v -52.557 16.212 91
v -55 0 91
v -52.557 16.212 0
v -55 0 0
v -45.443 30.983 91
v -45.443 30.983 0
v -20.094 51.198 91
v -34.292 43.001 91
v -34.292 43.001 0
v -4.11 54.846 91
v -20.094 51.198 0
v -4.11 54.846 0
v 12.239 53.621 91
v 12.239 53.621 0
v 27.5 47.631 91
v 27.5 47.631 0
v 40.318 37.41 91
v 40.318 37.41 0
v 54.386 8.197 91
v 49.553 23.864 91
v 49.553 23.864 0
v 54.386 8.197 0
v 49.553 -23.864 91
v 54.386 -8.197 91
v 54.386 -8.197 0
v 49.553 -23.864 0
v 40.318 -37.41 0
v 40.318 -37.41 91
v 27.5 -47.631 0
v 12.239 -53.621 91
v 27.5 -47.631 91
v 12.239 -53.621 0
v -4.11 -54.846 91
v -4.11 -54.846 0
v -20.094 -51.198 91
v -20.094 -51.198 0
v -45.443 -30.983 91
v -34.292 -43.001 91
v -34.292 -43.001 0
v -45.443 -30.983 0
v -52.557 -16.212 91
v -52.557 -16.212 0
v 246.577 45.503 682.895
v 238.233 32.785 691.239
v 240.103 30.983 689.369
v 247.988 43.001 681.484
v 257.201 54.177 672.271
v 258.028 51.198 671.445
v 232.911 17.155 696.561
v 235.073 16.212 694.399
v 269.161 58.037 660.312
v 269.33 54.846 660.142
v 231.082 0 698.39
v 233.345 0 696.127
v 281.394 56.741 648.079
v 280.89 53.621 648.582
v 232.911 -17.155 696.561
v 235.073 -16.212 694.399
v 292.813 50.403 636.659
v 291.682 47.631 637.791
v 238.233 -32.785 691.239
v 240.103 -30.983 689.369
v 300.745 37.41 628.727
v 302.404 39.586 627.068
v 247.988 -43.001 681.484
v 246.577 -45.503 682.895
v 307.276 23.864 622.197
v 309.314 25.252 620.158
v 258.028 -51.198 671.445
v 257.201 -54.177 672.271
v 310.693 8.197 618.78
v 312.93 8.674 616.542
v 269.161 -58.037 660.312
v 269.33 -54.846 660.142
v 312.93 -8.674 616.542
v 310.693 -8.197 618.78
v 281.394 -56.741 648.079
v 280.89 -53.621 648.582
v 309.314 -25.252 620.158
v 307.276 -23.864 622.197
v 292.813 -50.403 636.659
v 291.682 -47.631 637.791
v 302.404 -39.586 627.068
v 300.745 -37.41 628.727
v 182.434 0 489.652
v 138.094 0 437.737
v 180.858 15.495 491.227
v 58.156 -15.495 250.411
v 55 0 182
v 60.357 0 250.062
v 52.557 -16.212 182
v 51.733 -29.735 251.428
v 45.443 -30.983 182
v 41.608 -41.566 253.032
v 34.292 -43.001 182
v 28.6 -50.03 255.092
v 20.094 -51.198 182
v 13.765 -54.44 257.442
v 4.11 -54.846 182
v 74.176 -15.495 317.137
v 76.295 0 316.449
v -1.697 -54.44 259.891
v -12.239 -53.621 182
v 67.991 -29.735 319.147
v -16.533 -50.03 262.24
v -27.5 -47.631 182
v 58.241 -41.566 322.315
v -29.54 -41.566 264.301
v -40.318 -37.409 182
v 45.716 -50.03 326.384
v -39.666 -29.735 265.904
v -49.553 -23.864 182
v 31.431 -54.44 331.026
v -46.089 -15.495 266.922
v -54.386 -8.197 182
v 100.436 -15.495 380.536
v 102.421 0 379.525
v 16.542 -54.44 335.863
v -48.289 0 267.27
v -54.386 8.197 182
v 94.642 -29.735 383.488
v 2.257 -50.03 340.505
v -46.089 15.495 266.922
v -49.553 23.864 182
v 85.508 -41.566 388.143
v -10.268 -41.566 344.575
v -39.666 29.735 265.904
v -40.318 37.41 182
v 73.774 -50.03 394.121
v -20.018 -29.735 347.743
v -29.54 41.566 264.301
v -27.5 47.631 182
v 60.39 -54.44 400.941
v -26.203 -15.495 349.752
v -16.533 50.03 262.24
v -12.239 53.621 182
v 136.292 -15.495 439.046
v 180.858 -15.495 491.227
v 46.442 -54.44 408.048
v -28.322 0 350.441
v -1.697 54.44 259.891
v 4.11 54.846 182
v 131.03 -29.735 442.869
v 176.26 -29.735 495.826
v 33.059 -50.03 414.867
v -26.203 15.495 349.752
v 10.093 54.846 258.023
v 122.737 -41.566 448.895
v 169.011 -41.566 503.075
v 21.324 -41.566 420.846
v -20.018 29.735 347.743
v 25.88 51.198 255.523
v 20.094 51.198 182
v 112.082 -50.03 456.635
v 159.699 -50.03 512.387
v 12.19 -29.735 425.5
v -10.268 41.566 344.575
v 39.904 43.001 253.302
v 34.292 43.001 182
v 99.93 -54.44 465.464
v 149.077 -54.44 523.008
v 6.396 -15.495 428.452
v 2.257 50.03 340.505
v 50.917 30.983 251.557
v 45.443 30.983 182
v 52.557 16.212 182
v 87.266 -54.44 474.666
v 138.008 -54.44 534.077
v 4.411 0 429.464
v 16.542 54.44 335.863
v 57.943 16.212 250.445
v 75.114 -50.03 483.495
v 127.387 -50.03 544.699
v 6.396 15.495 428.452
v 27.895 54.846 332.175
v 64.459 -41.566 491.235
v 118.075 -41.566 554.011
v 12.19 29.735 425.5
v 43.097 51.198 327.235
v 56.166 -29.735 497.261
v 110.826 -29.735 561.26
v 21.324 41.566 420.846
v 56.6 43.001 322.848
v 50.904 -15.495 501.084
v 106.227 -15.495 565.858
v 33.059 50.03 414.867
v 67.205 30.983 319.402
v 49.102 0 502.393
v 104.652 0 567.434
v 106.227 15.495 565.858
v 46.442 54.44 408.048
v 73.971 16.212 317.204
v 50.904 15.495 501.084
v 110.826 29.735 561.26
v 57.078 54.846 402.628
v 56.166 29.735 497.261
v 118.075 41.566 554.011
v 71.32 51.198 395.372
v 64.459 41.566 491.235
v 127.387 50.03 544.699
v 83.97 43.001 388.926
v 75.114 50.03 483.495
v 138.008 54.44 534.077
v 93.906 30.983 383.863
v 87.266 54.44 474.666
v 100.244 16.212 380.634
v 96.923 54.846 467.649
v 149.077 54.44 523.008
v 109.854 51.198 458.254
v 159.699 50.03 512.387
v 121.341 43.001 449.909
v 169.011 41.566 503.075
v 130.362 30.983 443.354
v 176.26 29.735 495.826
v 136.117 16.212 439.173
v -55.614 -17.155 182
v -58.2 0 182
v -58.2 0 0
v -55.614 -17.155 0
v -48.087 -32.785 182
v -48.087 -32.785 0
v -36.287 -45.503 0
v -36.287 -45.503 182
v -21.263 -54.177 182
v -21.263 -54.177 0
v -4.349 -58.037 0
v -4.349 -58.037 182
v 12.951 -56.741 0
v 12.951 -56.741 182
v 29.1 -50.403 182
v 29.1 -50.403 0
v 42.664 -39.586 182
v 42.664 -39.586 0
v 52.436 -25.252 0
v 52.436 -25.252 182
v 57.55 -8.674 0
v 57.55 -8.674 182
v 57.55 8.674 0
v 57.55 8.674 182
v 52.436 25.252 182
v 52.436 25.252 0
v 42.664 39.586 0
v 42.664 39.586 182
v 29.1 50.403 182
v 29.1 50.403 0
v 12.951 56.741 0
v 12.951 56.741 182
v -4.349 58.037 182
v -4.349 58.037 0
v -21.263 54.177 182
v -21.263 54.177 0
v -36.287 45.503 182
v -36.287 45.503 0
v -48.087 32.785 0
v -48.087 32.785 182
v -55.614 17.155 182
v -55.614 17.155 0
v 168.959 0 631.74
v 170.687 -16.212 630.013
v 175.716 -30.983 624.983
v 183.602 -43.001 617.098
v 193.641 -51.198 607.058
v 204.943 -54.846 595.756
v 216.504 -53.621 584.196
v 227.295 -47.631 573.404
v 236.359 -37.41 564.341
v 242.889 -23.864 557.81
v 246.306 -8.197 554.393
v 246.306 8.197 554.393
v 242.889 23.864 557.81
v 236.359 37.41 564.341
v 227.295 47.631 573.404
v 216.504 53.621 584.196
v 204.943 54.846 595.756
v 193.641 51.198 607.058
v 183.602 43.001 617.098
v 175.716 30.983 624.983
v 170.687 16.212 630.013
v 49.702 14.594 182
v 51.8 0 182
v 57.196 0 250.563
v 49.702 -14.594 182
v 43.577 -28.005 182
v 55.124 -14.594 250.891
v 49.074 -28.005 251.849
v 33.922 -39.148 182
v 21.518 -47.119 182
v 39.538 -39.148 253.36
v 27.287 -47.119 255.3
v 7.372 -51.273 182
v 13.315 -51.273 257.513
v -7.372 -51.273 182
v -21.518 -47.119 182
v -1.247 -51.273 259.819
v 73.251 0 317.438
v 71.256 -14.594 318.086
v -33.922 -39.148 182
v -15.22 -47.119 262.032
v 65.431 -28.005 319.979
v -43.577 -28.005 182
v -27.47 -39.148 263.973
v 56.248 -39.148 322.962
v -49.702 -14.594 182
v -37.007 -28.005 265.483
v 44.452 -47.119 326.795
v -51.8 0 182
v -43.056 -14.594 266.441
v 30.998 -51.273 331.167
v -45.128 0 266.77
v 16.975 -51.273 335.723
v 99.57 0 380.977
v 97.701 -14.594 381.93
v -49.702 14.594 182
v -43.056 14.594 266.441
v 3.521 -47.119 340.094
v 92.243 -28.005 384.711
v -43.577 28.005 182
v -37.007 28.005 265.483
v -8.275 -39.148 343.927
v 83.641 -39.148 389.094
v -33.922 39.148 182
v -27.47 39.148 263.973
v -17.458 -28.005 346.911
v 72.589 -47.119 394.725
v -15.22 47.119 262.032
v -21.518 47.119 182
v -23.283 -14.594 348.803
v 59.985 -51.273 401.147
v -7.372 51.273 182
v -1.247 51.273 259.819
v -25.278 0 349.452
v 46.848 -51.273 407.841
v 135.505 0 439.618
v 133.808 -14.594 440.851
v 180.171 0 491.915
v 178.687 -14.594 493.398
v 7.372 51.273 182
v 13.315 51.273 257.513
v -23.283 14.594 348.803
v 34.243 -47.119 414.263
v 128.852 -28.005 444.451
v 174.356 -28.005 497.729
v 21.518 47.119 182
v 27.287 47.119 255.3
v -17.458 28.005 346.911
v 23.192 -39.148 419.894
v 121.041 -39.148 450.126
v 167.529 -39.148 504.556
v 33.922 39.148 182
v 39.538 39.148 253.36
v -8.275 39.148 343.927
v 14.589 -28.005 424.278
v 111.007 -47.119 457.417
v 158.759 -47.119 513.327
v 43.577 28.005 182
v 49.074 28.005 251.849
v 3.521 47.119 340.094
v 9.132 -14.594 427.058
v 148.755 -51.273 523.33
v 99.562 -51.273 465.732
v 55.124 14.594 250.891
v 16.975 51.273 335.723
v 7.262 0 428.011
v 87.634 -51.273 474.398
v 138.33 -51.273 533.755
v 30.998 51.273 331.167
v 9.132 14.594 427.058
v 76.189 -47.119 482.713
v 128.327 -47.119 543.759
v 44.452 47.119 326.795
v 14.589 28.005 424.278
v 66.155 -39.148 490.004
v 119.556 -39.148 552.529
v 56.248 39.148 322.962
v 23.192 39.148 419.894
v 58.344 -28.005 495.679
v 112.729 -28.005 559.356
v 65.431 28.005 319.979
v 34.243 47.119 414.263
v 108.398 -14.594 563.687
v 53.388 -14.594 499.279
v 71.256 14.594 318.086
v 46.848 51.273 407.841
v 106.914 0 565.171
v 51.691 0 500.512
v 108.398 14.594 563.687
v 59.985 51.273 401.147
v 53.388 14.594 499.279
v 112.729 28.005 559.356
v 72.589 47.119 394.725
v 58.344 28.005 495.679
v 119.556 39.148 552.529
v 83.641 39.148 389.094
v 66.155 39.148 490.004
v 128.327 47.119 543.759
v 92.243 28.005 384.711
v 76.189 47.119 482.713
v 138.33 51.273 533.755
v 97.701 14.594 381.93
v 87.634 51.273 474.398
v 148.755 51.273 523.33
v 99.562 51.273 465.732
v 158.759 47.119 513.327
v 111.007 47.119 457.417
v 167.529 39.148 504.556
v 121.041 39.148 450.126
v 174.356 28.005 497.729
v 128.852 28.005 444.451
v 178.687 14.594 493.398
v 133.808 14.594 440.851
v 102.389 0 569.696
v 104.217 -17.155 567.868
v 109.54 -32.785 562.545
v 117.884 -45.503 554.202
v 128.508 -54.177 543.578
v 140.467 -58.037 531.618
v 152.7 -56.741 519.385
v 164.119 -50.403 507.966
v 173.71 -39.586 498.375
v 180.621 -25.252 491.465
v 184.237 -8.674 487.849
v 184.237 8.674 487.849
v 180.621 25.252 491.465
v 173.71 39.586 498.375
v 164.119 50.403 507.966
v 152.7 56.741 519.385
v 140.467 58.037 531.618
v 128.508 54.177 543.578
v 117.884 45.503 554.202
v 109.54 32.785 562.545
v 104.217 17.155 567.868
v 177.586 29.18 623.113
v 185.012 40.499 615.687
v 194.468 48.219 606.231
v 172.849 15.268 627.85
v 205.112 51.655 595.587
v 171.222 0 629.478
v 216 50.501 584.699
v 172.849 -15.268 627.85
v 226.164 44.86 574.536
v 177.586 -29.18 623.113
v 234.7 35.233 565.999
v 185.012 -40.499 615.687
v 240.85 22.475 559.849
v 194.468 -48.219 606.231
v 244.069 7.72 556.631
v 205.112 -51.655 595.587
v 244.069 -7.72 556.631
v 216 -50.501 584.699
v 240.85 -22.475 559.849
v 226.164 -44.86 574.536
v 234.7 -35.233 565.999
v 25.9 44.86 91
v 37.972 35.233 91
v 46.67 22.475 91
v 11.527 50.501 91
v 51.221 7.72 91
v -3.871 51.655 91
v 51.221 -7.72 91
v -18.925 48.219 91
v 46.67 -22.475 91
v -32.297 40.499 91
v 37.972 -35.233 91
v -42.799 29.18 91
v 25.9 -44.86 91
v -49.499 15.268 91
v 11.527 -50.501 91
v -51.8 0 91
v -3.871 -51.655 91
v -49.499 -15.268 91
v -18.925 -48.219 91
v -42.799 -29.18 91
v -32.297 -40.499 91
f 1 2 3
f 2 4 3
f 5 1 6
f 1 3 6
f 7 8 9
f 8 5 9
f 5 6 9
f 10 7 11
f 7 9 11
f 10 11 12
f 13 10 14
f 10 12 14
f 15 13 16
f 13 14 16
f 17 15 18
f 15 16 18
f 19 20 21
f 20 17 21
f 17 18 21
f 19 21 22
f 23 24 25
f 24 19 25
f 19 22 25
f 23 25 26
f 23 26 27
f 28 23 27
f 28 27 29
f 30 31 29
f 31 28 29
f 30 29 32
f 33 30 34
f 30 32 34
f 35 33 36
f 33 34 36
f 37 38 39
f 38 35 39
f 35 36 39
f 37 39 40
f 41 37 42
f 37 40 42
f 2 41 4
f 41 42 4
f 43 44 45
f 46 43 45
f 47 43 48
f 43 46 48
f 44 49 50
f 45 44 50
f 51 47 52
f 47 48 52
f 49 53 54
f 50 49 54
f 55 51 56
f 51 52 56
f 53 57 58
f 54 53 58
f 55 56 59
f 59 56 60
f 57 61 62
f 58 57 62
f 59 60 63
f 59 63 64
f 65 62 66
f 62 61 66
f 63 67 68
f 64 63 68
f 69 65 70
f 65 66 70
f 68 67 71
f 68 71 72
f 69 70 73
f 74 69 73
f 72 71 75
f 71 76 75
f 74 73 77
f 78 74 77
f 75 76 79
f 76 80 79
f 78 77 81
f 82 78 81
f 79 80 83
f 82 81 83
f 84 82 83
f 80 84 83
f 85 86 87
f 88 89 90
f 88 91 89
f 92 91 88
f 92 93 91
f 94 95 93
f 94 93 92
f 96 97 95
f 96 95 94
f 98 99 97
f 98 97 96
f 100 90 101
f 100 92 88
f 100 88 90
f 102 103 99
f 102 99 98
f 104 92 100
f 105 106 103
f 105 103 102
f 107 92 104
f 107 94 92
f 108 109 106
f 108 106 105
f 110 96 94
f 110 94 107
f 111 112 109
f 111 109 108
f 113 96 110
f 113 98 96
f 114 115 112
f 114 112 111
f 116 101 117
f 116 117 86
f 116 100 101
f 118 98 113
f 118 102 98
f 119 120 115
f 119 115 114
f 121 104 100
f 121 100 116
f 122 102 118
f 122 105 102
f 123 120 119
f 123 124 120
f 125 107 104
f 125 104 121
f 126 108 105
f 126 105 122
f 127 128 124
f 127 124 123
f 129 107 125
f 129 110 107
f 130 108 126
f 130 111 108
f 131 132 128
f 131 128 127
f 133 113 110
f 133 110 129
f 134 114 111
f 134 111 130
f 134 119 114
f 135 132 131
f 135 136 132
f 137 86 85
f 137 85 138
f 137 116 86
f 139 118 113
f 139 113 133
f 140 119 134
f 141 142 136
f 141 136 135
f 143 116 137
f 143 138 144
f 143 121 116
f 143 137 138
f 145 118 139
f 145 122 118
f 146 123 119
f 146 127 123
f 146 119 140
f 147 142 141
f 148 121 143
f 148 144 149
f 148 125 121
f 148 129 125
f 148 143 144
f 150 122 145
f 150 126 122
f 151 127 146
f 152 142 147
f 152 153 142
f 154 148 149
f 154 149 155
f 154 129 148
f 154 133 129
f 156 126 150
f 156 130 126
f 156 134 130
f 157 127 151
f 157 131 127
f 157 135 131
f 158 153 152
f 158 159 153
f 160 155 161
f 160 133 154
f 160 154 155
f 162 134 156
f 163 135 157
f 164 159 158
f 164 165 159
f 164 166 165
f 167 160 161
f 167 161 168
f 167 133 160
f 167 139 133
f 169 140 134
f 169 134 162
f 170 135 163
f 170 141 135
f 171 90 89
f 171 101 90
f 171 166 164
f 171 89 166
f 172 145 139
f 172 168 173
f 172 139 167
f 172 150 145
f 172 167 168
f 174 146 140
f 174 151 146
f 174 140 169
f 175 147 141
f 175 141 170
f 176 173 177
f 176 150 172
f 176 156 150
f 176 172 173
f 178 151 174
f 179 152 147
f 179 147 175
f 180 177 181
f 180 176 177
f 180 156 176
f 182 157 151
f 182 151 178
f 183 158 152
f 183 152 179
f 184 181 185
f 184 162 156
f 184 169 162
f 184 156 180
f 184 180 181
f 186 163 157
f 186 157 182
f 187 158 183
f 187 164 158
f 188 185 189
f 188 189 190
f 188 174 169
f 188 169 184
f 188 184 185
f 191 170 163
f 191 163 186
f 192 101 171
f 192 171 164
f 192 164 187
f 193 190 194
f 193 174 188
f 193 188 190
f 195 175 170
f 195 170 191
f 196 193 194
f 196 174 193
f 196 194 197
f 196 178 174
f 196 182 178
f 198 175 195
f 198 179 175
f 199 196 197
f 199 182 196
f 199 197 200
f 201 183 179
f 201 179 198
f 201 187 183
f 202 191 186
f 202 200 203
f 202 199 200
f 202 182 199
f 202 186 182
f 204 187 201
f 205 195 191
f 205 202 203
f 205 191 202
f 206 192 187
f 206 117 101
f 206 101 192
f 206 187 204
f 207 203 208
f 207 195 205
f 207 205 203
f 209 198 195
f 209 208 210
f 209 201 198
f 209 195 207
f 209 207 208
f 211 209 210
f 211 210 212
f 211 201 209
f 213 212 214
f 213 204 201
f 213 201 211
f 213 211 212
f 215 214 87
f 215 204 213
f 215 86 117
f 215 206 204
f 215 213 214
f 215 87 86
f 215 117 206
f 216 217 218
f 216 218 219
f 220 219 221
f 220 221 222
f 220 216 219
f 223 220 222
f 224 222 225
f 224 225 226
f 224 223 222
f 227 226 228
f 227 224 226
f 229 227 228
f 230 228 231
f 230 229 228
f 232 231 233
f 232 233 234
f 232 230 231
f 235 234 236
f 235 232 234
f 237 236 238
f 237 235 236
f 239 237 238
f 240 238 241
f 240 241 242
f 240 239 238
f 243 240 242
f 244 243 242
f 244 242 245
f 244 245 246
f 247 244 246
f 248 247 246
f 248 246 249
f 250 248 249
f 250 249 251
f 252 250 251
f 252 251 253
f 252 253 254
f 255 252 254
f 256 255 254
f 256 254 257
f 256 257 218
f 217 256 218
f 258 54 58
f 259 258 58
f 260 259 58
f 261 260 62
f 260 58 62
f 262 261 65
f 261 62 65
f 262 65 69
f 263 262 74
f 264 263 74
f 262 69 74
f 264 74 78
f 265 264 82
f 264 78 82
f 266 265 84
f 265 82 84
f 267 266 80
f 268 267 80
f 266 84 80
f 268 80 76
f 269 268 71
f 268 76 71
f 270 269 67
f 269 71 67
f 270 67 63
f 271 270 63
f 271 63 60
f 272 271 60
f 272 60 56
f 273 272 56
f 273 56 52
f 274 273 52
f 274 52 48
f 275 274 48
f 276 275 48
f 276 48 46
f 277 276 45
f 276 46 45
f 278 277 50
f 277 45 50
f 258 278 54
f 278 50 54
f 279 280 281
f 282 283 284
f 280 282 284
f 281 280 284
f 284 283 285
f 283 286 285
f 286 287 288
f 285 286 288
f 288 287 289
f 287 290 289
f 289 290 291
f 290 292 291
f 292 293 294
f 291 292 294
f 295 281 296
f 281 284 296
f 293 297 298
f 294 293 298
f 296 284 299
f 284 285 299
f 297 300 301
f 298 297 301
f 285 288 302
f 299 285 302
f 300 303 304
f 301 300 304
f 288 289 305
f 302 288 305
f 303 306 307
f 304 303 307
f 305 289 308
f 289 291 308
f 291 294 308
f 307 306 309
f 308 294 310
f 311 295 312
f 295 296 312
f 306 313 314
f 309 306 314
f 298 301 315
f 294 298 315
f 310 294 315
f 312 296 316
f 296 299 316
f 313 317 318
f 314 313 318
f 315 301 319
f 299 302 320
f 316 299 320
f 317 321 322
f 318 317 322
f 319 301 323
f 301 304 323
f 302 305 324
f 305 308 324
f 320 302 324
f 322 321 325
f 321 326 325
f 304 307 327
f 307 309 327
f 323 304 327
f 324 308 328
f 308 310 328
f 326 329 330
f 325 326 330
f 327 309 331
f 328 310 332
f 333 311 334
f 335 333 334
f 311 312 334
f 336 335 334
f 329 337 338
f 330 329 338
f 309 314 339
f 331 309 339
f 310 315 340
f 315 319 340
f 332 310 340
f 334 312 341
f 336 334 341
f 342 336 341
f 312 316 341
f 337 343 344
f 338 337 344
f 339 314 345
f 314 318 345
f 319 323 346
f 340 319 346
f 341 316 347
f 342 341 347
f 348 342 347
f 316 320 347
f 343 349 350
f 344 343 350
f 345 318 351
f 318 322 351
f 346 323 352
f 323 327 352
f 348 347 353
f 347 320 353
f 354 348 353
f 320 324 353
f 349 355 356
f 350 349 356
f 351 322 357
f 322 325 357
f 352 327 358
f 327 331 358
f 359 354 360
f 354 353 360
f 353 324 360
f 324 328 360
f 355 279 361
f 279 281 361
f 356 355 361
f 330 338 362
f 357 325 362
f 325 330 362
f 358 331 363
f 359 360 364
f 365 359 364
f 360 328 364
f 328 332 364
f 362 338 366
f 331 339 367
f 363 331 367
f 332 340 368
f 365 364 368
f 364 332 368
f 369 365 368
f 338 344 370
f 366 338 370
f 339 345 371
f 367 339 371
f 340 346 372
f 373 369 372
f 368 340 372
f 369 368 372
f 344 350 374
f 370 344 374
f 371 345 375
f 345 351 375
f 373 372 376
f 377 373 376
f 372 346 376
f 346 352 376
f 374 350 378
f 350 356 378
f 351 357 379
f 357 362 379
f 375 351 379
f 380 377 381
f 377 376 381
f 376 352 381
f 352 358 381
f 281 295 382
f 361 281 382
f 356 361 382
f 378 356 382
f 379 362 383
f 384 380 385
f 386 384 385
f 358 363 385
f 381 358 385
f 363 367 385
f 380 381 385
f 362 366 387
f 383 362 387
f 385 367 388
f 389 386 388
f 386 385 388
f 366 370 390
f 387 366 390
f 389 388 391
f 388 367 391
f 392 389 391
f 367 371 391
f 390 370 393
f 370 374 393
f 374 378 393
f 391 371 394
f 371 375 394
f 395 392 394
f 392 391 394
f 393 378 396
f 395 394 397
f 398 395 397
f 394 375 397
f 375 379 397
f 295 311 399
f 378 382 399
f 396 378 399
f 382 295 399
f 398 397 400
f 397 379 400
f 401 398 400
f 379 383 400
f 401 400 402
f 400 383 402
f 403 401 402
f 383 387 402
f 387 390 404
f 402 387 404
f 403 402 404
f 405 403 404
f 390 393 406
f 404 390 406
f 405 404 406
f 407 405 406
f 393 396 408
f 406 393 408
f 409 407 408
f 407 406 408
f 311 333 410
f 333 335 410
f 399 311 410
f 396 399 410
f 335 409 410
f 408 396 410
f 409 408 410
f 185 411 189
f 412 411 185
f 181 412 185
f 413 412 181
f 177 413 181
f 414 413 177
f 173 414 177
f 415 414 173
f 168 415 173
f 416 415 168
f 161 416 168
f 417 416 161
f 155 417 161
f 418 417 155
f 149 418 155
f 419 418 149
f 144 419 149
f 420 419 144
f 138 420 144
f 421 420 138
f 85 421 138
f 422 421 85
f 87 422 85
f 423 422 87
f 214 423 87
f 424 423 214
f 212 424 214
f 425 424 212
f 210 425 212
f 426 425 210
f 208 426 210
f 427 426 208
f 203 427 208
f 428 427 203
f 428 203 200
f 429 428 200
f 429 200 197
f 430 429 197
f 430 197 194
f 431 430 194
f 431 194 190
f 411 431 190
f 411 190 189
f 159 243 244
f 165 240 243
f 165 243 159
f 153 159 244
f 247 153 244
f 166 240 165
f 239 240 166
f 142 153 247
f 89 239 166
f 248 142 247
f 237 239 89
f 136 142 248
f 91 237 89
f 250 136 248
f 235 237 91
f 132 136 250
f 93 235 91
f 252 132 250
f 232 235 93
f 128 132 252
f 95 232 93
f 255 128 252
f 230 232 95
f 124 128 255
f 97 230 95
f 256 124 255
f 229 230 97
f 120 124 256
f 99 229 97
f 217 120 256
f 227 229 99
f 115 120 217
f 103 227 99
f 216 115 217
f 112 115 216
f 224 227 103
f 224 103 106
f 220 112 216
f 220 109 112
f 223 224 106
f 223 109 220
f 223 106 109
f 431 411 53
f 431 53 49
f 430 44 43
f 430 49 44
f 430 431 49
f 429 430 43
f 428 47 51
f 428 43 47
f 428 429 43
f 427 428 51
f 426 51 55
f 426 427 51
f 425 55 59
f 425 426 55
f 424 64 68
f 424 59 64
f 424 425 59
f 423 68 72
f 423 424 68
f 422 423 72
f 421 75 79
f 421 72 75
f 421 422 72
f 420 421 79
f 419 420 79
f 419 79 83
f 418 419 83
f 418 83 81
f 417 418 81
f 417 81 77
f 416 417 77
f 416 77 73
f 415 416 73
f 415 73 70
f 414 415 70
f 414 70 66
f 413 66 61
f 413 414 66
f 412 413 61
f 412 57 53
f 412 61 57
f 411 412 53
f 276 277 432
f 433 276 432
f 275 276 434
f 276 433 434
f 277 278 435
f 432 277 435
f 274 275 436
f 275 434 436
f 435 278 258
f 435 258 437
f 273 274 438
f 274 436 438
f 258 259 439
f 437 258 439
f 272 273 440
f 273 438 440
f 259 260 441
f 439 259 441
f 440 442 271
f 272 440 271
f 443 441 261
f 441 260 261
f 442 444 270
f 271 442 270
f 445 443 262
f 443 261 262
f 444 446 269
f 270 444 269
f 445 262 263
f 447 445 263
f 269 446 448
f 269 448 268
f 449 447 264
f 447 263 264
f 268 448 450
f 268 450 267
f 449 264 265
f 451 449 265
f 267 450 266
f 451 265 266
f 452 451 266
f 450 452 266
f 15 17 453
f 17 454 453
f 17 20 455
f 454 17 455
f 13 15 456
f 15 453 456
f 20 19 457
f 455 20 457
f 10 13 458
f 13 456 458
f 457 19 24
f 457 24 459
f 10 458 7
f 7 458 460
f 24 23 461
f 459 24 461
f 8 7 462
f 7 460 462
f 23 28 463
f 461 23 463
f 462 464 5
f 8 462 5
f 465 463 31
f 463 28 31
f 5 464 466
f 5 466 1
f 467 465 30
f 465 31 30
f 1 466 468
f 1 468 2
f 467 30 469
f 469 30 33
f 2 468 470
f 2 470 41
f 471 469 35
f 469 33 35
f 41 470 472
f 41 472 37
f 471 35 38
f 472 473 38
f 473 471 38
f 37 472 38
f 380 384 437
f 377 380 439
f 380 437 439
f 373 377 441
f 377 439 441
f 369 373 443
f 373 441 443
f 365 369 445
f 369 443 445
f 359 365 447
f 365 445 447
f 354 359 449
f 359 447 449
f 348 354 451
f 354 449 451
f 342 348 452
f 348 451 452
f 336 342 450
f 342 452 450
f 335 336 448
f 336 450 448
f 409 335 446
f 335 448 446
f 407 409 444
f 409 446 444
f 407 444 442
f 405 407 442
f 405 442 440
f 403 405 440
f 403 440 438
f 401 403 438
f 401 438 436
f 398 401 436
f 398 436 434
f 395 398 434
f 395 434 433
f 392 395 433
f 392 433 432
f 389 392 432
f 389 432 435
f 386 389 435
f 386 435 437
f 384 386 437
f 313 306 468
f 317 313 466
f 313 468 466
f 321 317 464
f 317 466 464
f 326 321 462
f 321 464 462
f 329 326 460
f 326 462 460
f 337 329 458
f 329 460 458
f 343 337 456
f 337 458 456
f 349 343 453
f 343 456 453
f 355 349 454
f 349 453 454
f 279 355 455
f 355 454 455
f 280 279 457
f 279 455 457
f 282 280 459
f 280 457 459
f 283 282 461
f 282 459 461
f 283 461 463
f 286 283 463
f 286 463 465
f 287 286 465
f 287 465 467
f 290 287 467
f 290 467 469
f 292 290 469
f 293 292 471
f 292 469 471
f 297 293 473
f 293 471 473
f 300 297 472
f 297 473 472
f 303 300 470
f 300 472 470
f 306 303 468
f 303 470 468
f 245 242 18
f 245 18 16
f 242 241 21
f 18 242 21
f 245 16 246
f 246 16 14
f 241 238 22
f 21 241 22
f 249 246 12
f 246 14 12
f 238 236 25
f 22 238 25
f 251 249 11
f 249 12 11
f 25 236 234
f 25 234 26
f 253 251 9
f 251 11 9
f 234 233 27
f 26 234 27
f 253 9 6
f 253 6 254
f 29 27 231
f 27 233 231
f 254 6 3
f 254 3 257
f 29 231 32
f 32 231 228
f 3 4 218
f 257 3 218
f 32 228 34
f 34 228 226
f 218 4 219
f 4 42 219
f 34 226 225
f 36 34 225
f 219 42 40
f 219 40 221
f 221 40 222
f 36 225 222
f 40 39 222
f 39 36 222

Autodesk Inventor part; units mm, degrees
ref_plane "YZ Plane" through (0, 0, 0) normal (1, 0, 0) x (0, 1, 0)
ref_plane "XZ Plane" through (0, 0, 0) normal (0, 1, 0) x (-1, 0, 0)
ref_plane "XY Plane" through (0, 0, 0) normal (0, 0, 1) x (1, 0, 0)
sketch "Sketch1" plane through (0, 0, 0) normal (0, 1, 0) x (-1, 0, 0)
  line L0 (0, 0) -> (0, 182) construction
  line L1 (0, 182) -> (51.8, 182) construction
  line L2 (51.8, 182) -> (51.8, 91)
  line L3 (51.8, 91) -> (55, 91)
  line L4 (55, 91) -> (55, 0)
  line L5 (55, 0) -> (58.2, 0)
  line L6 (58.2, 0) -> (58.2, 182)
  line L7 (58.2, 182) -> (51.8, 182)
  line L8 (55, 0) -> (0, 0) construction
  line L9 (0, 182) -> (0, 385) construction
  line L10 (0, 385) -> (-143.5427, 528.5427) construction
  line L11 (-143.5427, 528.5427) -> (-106.9145, 565.1708) construction
  line L12 (-106.9145, 565.1708) -> (-171.2215, 629.4777)
  line L13 (-171.2215, 629.4777) -> (-168.9587, 631.7405)
  line L14 (-168.9587, 631.7405) -> (-233.3452, 696.127)
  line L15 (-233.3452, 696.127) -> (-231.0825, 698.3897)
  line L16 (-231.0825, 698.3897) -> (-102.3891, 569.6963)
  line L17 (-106.9145, 565.1708) -> (-102.3891, 569.6963)
  line L18 (-143.5427, 528.5427) -> (-272.2361, 657.2361) construction
  line L19 (-233.3452, 696.127) -> (-272.2361, 657.2361) construction
  line L20 (0, 182) -> (-490.0854, 182) construction
  line L21 (-143.5427, 528.5427) -> (-490.0854, 182) construction
  arc A0 (0, 182) -> (-143.5427, 528.5427) centre (-490.0854, 182) ccw
  line L22 (-143.5427, 528.5427) -> (-143.5427, 182) construction
  line L23 (51.8, 91) -> (0, 91) construction
  line L24 (-171.2215, 629.4777) -> (-207.8496, 592.8496) construction
  dimension "d0" = 182
  dimension "d1" = 91
  dimension "d2" = 103.6
  dimension "d3" = 110
  dimension "d4" = 116.4
  dimension "d5" = 203
  dimension "d6" = 203
  dimension "d7" = 182
  dimension "d8" = 91
  dimension "d9" = 103.6
  dimension "d10" = 110
  dimension "d11" = 116.4
  dimension "d12" = 45
revolve "Revolve1" add sketch "Sketch1" angle 360 about axis through (0, 0, 0) along (0, 0, 1) contours L7 L6 L5 L4 L3 L2
revolve "Revolve2" add sketch "Sketch1" angle 360 about axis through (143.5427, 0, 528.5427) along (0.7071068, 0, 0.7071068) contours L12 L13 L14 L15 L16 L17
sketch "Sketch2" plane through (0, 0, 182) normal (0, 0, 1) x (1, 0, 0)
  circle A0 centre (0, 0) radius 51.8 projected
  circle A1 centre (0, 0) radius 55 projected
sweep "Sweep1" add profiles "Sketch2" path "Sketch1" path curves A0
equation "\"d0\" = 2 * tk"
equation "\"d1\" = tk"
equation "\"d2\" = d - 2 * s1"
equation "\"d3\" = d"
equation "\"d4\" = d + 2 * s1"
equation "\"d5\" = zk"
equation "\"d6\" = zk"
equation "\"d7\" = 2 * tk"
equation "\"d8\" = tk"
equation "\"d9\" = d - 2 * s1"
equation "\"d10\" = d"
equation "\"d11\" = d + 2 * s1"
equation "\"zk\" = 203"
equation "\"tk\" = 91"
equation "\"d\" = 110"
equation "\"s1\" = 3.2"
properties part number "DIN 8063 Двойная подвижная соединительная муфта с изгибом 45 градусов со стыковой сваркой - MMK - KK 110 - 3" material "ПВХ, непластифицированный"
